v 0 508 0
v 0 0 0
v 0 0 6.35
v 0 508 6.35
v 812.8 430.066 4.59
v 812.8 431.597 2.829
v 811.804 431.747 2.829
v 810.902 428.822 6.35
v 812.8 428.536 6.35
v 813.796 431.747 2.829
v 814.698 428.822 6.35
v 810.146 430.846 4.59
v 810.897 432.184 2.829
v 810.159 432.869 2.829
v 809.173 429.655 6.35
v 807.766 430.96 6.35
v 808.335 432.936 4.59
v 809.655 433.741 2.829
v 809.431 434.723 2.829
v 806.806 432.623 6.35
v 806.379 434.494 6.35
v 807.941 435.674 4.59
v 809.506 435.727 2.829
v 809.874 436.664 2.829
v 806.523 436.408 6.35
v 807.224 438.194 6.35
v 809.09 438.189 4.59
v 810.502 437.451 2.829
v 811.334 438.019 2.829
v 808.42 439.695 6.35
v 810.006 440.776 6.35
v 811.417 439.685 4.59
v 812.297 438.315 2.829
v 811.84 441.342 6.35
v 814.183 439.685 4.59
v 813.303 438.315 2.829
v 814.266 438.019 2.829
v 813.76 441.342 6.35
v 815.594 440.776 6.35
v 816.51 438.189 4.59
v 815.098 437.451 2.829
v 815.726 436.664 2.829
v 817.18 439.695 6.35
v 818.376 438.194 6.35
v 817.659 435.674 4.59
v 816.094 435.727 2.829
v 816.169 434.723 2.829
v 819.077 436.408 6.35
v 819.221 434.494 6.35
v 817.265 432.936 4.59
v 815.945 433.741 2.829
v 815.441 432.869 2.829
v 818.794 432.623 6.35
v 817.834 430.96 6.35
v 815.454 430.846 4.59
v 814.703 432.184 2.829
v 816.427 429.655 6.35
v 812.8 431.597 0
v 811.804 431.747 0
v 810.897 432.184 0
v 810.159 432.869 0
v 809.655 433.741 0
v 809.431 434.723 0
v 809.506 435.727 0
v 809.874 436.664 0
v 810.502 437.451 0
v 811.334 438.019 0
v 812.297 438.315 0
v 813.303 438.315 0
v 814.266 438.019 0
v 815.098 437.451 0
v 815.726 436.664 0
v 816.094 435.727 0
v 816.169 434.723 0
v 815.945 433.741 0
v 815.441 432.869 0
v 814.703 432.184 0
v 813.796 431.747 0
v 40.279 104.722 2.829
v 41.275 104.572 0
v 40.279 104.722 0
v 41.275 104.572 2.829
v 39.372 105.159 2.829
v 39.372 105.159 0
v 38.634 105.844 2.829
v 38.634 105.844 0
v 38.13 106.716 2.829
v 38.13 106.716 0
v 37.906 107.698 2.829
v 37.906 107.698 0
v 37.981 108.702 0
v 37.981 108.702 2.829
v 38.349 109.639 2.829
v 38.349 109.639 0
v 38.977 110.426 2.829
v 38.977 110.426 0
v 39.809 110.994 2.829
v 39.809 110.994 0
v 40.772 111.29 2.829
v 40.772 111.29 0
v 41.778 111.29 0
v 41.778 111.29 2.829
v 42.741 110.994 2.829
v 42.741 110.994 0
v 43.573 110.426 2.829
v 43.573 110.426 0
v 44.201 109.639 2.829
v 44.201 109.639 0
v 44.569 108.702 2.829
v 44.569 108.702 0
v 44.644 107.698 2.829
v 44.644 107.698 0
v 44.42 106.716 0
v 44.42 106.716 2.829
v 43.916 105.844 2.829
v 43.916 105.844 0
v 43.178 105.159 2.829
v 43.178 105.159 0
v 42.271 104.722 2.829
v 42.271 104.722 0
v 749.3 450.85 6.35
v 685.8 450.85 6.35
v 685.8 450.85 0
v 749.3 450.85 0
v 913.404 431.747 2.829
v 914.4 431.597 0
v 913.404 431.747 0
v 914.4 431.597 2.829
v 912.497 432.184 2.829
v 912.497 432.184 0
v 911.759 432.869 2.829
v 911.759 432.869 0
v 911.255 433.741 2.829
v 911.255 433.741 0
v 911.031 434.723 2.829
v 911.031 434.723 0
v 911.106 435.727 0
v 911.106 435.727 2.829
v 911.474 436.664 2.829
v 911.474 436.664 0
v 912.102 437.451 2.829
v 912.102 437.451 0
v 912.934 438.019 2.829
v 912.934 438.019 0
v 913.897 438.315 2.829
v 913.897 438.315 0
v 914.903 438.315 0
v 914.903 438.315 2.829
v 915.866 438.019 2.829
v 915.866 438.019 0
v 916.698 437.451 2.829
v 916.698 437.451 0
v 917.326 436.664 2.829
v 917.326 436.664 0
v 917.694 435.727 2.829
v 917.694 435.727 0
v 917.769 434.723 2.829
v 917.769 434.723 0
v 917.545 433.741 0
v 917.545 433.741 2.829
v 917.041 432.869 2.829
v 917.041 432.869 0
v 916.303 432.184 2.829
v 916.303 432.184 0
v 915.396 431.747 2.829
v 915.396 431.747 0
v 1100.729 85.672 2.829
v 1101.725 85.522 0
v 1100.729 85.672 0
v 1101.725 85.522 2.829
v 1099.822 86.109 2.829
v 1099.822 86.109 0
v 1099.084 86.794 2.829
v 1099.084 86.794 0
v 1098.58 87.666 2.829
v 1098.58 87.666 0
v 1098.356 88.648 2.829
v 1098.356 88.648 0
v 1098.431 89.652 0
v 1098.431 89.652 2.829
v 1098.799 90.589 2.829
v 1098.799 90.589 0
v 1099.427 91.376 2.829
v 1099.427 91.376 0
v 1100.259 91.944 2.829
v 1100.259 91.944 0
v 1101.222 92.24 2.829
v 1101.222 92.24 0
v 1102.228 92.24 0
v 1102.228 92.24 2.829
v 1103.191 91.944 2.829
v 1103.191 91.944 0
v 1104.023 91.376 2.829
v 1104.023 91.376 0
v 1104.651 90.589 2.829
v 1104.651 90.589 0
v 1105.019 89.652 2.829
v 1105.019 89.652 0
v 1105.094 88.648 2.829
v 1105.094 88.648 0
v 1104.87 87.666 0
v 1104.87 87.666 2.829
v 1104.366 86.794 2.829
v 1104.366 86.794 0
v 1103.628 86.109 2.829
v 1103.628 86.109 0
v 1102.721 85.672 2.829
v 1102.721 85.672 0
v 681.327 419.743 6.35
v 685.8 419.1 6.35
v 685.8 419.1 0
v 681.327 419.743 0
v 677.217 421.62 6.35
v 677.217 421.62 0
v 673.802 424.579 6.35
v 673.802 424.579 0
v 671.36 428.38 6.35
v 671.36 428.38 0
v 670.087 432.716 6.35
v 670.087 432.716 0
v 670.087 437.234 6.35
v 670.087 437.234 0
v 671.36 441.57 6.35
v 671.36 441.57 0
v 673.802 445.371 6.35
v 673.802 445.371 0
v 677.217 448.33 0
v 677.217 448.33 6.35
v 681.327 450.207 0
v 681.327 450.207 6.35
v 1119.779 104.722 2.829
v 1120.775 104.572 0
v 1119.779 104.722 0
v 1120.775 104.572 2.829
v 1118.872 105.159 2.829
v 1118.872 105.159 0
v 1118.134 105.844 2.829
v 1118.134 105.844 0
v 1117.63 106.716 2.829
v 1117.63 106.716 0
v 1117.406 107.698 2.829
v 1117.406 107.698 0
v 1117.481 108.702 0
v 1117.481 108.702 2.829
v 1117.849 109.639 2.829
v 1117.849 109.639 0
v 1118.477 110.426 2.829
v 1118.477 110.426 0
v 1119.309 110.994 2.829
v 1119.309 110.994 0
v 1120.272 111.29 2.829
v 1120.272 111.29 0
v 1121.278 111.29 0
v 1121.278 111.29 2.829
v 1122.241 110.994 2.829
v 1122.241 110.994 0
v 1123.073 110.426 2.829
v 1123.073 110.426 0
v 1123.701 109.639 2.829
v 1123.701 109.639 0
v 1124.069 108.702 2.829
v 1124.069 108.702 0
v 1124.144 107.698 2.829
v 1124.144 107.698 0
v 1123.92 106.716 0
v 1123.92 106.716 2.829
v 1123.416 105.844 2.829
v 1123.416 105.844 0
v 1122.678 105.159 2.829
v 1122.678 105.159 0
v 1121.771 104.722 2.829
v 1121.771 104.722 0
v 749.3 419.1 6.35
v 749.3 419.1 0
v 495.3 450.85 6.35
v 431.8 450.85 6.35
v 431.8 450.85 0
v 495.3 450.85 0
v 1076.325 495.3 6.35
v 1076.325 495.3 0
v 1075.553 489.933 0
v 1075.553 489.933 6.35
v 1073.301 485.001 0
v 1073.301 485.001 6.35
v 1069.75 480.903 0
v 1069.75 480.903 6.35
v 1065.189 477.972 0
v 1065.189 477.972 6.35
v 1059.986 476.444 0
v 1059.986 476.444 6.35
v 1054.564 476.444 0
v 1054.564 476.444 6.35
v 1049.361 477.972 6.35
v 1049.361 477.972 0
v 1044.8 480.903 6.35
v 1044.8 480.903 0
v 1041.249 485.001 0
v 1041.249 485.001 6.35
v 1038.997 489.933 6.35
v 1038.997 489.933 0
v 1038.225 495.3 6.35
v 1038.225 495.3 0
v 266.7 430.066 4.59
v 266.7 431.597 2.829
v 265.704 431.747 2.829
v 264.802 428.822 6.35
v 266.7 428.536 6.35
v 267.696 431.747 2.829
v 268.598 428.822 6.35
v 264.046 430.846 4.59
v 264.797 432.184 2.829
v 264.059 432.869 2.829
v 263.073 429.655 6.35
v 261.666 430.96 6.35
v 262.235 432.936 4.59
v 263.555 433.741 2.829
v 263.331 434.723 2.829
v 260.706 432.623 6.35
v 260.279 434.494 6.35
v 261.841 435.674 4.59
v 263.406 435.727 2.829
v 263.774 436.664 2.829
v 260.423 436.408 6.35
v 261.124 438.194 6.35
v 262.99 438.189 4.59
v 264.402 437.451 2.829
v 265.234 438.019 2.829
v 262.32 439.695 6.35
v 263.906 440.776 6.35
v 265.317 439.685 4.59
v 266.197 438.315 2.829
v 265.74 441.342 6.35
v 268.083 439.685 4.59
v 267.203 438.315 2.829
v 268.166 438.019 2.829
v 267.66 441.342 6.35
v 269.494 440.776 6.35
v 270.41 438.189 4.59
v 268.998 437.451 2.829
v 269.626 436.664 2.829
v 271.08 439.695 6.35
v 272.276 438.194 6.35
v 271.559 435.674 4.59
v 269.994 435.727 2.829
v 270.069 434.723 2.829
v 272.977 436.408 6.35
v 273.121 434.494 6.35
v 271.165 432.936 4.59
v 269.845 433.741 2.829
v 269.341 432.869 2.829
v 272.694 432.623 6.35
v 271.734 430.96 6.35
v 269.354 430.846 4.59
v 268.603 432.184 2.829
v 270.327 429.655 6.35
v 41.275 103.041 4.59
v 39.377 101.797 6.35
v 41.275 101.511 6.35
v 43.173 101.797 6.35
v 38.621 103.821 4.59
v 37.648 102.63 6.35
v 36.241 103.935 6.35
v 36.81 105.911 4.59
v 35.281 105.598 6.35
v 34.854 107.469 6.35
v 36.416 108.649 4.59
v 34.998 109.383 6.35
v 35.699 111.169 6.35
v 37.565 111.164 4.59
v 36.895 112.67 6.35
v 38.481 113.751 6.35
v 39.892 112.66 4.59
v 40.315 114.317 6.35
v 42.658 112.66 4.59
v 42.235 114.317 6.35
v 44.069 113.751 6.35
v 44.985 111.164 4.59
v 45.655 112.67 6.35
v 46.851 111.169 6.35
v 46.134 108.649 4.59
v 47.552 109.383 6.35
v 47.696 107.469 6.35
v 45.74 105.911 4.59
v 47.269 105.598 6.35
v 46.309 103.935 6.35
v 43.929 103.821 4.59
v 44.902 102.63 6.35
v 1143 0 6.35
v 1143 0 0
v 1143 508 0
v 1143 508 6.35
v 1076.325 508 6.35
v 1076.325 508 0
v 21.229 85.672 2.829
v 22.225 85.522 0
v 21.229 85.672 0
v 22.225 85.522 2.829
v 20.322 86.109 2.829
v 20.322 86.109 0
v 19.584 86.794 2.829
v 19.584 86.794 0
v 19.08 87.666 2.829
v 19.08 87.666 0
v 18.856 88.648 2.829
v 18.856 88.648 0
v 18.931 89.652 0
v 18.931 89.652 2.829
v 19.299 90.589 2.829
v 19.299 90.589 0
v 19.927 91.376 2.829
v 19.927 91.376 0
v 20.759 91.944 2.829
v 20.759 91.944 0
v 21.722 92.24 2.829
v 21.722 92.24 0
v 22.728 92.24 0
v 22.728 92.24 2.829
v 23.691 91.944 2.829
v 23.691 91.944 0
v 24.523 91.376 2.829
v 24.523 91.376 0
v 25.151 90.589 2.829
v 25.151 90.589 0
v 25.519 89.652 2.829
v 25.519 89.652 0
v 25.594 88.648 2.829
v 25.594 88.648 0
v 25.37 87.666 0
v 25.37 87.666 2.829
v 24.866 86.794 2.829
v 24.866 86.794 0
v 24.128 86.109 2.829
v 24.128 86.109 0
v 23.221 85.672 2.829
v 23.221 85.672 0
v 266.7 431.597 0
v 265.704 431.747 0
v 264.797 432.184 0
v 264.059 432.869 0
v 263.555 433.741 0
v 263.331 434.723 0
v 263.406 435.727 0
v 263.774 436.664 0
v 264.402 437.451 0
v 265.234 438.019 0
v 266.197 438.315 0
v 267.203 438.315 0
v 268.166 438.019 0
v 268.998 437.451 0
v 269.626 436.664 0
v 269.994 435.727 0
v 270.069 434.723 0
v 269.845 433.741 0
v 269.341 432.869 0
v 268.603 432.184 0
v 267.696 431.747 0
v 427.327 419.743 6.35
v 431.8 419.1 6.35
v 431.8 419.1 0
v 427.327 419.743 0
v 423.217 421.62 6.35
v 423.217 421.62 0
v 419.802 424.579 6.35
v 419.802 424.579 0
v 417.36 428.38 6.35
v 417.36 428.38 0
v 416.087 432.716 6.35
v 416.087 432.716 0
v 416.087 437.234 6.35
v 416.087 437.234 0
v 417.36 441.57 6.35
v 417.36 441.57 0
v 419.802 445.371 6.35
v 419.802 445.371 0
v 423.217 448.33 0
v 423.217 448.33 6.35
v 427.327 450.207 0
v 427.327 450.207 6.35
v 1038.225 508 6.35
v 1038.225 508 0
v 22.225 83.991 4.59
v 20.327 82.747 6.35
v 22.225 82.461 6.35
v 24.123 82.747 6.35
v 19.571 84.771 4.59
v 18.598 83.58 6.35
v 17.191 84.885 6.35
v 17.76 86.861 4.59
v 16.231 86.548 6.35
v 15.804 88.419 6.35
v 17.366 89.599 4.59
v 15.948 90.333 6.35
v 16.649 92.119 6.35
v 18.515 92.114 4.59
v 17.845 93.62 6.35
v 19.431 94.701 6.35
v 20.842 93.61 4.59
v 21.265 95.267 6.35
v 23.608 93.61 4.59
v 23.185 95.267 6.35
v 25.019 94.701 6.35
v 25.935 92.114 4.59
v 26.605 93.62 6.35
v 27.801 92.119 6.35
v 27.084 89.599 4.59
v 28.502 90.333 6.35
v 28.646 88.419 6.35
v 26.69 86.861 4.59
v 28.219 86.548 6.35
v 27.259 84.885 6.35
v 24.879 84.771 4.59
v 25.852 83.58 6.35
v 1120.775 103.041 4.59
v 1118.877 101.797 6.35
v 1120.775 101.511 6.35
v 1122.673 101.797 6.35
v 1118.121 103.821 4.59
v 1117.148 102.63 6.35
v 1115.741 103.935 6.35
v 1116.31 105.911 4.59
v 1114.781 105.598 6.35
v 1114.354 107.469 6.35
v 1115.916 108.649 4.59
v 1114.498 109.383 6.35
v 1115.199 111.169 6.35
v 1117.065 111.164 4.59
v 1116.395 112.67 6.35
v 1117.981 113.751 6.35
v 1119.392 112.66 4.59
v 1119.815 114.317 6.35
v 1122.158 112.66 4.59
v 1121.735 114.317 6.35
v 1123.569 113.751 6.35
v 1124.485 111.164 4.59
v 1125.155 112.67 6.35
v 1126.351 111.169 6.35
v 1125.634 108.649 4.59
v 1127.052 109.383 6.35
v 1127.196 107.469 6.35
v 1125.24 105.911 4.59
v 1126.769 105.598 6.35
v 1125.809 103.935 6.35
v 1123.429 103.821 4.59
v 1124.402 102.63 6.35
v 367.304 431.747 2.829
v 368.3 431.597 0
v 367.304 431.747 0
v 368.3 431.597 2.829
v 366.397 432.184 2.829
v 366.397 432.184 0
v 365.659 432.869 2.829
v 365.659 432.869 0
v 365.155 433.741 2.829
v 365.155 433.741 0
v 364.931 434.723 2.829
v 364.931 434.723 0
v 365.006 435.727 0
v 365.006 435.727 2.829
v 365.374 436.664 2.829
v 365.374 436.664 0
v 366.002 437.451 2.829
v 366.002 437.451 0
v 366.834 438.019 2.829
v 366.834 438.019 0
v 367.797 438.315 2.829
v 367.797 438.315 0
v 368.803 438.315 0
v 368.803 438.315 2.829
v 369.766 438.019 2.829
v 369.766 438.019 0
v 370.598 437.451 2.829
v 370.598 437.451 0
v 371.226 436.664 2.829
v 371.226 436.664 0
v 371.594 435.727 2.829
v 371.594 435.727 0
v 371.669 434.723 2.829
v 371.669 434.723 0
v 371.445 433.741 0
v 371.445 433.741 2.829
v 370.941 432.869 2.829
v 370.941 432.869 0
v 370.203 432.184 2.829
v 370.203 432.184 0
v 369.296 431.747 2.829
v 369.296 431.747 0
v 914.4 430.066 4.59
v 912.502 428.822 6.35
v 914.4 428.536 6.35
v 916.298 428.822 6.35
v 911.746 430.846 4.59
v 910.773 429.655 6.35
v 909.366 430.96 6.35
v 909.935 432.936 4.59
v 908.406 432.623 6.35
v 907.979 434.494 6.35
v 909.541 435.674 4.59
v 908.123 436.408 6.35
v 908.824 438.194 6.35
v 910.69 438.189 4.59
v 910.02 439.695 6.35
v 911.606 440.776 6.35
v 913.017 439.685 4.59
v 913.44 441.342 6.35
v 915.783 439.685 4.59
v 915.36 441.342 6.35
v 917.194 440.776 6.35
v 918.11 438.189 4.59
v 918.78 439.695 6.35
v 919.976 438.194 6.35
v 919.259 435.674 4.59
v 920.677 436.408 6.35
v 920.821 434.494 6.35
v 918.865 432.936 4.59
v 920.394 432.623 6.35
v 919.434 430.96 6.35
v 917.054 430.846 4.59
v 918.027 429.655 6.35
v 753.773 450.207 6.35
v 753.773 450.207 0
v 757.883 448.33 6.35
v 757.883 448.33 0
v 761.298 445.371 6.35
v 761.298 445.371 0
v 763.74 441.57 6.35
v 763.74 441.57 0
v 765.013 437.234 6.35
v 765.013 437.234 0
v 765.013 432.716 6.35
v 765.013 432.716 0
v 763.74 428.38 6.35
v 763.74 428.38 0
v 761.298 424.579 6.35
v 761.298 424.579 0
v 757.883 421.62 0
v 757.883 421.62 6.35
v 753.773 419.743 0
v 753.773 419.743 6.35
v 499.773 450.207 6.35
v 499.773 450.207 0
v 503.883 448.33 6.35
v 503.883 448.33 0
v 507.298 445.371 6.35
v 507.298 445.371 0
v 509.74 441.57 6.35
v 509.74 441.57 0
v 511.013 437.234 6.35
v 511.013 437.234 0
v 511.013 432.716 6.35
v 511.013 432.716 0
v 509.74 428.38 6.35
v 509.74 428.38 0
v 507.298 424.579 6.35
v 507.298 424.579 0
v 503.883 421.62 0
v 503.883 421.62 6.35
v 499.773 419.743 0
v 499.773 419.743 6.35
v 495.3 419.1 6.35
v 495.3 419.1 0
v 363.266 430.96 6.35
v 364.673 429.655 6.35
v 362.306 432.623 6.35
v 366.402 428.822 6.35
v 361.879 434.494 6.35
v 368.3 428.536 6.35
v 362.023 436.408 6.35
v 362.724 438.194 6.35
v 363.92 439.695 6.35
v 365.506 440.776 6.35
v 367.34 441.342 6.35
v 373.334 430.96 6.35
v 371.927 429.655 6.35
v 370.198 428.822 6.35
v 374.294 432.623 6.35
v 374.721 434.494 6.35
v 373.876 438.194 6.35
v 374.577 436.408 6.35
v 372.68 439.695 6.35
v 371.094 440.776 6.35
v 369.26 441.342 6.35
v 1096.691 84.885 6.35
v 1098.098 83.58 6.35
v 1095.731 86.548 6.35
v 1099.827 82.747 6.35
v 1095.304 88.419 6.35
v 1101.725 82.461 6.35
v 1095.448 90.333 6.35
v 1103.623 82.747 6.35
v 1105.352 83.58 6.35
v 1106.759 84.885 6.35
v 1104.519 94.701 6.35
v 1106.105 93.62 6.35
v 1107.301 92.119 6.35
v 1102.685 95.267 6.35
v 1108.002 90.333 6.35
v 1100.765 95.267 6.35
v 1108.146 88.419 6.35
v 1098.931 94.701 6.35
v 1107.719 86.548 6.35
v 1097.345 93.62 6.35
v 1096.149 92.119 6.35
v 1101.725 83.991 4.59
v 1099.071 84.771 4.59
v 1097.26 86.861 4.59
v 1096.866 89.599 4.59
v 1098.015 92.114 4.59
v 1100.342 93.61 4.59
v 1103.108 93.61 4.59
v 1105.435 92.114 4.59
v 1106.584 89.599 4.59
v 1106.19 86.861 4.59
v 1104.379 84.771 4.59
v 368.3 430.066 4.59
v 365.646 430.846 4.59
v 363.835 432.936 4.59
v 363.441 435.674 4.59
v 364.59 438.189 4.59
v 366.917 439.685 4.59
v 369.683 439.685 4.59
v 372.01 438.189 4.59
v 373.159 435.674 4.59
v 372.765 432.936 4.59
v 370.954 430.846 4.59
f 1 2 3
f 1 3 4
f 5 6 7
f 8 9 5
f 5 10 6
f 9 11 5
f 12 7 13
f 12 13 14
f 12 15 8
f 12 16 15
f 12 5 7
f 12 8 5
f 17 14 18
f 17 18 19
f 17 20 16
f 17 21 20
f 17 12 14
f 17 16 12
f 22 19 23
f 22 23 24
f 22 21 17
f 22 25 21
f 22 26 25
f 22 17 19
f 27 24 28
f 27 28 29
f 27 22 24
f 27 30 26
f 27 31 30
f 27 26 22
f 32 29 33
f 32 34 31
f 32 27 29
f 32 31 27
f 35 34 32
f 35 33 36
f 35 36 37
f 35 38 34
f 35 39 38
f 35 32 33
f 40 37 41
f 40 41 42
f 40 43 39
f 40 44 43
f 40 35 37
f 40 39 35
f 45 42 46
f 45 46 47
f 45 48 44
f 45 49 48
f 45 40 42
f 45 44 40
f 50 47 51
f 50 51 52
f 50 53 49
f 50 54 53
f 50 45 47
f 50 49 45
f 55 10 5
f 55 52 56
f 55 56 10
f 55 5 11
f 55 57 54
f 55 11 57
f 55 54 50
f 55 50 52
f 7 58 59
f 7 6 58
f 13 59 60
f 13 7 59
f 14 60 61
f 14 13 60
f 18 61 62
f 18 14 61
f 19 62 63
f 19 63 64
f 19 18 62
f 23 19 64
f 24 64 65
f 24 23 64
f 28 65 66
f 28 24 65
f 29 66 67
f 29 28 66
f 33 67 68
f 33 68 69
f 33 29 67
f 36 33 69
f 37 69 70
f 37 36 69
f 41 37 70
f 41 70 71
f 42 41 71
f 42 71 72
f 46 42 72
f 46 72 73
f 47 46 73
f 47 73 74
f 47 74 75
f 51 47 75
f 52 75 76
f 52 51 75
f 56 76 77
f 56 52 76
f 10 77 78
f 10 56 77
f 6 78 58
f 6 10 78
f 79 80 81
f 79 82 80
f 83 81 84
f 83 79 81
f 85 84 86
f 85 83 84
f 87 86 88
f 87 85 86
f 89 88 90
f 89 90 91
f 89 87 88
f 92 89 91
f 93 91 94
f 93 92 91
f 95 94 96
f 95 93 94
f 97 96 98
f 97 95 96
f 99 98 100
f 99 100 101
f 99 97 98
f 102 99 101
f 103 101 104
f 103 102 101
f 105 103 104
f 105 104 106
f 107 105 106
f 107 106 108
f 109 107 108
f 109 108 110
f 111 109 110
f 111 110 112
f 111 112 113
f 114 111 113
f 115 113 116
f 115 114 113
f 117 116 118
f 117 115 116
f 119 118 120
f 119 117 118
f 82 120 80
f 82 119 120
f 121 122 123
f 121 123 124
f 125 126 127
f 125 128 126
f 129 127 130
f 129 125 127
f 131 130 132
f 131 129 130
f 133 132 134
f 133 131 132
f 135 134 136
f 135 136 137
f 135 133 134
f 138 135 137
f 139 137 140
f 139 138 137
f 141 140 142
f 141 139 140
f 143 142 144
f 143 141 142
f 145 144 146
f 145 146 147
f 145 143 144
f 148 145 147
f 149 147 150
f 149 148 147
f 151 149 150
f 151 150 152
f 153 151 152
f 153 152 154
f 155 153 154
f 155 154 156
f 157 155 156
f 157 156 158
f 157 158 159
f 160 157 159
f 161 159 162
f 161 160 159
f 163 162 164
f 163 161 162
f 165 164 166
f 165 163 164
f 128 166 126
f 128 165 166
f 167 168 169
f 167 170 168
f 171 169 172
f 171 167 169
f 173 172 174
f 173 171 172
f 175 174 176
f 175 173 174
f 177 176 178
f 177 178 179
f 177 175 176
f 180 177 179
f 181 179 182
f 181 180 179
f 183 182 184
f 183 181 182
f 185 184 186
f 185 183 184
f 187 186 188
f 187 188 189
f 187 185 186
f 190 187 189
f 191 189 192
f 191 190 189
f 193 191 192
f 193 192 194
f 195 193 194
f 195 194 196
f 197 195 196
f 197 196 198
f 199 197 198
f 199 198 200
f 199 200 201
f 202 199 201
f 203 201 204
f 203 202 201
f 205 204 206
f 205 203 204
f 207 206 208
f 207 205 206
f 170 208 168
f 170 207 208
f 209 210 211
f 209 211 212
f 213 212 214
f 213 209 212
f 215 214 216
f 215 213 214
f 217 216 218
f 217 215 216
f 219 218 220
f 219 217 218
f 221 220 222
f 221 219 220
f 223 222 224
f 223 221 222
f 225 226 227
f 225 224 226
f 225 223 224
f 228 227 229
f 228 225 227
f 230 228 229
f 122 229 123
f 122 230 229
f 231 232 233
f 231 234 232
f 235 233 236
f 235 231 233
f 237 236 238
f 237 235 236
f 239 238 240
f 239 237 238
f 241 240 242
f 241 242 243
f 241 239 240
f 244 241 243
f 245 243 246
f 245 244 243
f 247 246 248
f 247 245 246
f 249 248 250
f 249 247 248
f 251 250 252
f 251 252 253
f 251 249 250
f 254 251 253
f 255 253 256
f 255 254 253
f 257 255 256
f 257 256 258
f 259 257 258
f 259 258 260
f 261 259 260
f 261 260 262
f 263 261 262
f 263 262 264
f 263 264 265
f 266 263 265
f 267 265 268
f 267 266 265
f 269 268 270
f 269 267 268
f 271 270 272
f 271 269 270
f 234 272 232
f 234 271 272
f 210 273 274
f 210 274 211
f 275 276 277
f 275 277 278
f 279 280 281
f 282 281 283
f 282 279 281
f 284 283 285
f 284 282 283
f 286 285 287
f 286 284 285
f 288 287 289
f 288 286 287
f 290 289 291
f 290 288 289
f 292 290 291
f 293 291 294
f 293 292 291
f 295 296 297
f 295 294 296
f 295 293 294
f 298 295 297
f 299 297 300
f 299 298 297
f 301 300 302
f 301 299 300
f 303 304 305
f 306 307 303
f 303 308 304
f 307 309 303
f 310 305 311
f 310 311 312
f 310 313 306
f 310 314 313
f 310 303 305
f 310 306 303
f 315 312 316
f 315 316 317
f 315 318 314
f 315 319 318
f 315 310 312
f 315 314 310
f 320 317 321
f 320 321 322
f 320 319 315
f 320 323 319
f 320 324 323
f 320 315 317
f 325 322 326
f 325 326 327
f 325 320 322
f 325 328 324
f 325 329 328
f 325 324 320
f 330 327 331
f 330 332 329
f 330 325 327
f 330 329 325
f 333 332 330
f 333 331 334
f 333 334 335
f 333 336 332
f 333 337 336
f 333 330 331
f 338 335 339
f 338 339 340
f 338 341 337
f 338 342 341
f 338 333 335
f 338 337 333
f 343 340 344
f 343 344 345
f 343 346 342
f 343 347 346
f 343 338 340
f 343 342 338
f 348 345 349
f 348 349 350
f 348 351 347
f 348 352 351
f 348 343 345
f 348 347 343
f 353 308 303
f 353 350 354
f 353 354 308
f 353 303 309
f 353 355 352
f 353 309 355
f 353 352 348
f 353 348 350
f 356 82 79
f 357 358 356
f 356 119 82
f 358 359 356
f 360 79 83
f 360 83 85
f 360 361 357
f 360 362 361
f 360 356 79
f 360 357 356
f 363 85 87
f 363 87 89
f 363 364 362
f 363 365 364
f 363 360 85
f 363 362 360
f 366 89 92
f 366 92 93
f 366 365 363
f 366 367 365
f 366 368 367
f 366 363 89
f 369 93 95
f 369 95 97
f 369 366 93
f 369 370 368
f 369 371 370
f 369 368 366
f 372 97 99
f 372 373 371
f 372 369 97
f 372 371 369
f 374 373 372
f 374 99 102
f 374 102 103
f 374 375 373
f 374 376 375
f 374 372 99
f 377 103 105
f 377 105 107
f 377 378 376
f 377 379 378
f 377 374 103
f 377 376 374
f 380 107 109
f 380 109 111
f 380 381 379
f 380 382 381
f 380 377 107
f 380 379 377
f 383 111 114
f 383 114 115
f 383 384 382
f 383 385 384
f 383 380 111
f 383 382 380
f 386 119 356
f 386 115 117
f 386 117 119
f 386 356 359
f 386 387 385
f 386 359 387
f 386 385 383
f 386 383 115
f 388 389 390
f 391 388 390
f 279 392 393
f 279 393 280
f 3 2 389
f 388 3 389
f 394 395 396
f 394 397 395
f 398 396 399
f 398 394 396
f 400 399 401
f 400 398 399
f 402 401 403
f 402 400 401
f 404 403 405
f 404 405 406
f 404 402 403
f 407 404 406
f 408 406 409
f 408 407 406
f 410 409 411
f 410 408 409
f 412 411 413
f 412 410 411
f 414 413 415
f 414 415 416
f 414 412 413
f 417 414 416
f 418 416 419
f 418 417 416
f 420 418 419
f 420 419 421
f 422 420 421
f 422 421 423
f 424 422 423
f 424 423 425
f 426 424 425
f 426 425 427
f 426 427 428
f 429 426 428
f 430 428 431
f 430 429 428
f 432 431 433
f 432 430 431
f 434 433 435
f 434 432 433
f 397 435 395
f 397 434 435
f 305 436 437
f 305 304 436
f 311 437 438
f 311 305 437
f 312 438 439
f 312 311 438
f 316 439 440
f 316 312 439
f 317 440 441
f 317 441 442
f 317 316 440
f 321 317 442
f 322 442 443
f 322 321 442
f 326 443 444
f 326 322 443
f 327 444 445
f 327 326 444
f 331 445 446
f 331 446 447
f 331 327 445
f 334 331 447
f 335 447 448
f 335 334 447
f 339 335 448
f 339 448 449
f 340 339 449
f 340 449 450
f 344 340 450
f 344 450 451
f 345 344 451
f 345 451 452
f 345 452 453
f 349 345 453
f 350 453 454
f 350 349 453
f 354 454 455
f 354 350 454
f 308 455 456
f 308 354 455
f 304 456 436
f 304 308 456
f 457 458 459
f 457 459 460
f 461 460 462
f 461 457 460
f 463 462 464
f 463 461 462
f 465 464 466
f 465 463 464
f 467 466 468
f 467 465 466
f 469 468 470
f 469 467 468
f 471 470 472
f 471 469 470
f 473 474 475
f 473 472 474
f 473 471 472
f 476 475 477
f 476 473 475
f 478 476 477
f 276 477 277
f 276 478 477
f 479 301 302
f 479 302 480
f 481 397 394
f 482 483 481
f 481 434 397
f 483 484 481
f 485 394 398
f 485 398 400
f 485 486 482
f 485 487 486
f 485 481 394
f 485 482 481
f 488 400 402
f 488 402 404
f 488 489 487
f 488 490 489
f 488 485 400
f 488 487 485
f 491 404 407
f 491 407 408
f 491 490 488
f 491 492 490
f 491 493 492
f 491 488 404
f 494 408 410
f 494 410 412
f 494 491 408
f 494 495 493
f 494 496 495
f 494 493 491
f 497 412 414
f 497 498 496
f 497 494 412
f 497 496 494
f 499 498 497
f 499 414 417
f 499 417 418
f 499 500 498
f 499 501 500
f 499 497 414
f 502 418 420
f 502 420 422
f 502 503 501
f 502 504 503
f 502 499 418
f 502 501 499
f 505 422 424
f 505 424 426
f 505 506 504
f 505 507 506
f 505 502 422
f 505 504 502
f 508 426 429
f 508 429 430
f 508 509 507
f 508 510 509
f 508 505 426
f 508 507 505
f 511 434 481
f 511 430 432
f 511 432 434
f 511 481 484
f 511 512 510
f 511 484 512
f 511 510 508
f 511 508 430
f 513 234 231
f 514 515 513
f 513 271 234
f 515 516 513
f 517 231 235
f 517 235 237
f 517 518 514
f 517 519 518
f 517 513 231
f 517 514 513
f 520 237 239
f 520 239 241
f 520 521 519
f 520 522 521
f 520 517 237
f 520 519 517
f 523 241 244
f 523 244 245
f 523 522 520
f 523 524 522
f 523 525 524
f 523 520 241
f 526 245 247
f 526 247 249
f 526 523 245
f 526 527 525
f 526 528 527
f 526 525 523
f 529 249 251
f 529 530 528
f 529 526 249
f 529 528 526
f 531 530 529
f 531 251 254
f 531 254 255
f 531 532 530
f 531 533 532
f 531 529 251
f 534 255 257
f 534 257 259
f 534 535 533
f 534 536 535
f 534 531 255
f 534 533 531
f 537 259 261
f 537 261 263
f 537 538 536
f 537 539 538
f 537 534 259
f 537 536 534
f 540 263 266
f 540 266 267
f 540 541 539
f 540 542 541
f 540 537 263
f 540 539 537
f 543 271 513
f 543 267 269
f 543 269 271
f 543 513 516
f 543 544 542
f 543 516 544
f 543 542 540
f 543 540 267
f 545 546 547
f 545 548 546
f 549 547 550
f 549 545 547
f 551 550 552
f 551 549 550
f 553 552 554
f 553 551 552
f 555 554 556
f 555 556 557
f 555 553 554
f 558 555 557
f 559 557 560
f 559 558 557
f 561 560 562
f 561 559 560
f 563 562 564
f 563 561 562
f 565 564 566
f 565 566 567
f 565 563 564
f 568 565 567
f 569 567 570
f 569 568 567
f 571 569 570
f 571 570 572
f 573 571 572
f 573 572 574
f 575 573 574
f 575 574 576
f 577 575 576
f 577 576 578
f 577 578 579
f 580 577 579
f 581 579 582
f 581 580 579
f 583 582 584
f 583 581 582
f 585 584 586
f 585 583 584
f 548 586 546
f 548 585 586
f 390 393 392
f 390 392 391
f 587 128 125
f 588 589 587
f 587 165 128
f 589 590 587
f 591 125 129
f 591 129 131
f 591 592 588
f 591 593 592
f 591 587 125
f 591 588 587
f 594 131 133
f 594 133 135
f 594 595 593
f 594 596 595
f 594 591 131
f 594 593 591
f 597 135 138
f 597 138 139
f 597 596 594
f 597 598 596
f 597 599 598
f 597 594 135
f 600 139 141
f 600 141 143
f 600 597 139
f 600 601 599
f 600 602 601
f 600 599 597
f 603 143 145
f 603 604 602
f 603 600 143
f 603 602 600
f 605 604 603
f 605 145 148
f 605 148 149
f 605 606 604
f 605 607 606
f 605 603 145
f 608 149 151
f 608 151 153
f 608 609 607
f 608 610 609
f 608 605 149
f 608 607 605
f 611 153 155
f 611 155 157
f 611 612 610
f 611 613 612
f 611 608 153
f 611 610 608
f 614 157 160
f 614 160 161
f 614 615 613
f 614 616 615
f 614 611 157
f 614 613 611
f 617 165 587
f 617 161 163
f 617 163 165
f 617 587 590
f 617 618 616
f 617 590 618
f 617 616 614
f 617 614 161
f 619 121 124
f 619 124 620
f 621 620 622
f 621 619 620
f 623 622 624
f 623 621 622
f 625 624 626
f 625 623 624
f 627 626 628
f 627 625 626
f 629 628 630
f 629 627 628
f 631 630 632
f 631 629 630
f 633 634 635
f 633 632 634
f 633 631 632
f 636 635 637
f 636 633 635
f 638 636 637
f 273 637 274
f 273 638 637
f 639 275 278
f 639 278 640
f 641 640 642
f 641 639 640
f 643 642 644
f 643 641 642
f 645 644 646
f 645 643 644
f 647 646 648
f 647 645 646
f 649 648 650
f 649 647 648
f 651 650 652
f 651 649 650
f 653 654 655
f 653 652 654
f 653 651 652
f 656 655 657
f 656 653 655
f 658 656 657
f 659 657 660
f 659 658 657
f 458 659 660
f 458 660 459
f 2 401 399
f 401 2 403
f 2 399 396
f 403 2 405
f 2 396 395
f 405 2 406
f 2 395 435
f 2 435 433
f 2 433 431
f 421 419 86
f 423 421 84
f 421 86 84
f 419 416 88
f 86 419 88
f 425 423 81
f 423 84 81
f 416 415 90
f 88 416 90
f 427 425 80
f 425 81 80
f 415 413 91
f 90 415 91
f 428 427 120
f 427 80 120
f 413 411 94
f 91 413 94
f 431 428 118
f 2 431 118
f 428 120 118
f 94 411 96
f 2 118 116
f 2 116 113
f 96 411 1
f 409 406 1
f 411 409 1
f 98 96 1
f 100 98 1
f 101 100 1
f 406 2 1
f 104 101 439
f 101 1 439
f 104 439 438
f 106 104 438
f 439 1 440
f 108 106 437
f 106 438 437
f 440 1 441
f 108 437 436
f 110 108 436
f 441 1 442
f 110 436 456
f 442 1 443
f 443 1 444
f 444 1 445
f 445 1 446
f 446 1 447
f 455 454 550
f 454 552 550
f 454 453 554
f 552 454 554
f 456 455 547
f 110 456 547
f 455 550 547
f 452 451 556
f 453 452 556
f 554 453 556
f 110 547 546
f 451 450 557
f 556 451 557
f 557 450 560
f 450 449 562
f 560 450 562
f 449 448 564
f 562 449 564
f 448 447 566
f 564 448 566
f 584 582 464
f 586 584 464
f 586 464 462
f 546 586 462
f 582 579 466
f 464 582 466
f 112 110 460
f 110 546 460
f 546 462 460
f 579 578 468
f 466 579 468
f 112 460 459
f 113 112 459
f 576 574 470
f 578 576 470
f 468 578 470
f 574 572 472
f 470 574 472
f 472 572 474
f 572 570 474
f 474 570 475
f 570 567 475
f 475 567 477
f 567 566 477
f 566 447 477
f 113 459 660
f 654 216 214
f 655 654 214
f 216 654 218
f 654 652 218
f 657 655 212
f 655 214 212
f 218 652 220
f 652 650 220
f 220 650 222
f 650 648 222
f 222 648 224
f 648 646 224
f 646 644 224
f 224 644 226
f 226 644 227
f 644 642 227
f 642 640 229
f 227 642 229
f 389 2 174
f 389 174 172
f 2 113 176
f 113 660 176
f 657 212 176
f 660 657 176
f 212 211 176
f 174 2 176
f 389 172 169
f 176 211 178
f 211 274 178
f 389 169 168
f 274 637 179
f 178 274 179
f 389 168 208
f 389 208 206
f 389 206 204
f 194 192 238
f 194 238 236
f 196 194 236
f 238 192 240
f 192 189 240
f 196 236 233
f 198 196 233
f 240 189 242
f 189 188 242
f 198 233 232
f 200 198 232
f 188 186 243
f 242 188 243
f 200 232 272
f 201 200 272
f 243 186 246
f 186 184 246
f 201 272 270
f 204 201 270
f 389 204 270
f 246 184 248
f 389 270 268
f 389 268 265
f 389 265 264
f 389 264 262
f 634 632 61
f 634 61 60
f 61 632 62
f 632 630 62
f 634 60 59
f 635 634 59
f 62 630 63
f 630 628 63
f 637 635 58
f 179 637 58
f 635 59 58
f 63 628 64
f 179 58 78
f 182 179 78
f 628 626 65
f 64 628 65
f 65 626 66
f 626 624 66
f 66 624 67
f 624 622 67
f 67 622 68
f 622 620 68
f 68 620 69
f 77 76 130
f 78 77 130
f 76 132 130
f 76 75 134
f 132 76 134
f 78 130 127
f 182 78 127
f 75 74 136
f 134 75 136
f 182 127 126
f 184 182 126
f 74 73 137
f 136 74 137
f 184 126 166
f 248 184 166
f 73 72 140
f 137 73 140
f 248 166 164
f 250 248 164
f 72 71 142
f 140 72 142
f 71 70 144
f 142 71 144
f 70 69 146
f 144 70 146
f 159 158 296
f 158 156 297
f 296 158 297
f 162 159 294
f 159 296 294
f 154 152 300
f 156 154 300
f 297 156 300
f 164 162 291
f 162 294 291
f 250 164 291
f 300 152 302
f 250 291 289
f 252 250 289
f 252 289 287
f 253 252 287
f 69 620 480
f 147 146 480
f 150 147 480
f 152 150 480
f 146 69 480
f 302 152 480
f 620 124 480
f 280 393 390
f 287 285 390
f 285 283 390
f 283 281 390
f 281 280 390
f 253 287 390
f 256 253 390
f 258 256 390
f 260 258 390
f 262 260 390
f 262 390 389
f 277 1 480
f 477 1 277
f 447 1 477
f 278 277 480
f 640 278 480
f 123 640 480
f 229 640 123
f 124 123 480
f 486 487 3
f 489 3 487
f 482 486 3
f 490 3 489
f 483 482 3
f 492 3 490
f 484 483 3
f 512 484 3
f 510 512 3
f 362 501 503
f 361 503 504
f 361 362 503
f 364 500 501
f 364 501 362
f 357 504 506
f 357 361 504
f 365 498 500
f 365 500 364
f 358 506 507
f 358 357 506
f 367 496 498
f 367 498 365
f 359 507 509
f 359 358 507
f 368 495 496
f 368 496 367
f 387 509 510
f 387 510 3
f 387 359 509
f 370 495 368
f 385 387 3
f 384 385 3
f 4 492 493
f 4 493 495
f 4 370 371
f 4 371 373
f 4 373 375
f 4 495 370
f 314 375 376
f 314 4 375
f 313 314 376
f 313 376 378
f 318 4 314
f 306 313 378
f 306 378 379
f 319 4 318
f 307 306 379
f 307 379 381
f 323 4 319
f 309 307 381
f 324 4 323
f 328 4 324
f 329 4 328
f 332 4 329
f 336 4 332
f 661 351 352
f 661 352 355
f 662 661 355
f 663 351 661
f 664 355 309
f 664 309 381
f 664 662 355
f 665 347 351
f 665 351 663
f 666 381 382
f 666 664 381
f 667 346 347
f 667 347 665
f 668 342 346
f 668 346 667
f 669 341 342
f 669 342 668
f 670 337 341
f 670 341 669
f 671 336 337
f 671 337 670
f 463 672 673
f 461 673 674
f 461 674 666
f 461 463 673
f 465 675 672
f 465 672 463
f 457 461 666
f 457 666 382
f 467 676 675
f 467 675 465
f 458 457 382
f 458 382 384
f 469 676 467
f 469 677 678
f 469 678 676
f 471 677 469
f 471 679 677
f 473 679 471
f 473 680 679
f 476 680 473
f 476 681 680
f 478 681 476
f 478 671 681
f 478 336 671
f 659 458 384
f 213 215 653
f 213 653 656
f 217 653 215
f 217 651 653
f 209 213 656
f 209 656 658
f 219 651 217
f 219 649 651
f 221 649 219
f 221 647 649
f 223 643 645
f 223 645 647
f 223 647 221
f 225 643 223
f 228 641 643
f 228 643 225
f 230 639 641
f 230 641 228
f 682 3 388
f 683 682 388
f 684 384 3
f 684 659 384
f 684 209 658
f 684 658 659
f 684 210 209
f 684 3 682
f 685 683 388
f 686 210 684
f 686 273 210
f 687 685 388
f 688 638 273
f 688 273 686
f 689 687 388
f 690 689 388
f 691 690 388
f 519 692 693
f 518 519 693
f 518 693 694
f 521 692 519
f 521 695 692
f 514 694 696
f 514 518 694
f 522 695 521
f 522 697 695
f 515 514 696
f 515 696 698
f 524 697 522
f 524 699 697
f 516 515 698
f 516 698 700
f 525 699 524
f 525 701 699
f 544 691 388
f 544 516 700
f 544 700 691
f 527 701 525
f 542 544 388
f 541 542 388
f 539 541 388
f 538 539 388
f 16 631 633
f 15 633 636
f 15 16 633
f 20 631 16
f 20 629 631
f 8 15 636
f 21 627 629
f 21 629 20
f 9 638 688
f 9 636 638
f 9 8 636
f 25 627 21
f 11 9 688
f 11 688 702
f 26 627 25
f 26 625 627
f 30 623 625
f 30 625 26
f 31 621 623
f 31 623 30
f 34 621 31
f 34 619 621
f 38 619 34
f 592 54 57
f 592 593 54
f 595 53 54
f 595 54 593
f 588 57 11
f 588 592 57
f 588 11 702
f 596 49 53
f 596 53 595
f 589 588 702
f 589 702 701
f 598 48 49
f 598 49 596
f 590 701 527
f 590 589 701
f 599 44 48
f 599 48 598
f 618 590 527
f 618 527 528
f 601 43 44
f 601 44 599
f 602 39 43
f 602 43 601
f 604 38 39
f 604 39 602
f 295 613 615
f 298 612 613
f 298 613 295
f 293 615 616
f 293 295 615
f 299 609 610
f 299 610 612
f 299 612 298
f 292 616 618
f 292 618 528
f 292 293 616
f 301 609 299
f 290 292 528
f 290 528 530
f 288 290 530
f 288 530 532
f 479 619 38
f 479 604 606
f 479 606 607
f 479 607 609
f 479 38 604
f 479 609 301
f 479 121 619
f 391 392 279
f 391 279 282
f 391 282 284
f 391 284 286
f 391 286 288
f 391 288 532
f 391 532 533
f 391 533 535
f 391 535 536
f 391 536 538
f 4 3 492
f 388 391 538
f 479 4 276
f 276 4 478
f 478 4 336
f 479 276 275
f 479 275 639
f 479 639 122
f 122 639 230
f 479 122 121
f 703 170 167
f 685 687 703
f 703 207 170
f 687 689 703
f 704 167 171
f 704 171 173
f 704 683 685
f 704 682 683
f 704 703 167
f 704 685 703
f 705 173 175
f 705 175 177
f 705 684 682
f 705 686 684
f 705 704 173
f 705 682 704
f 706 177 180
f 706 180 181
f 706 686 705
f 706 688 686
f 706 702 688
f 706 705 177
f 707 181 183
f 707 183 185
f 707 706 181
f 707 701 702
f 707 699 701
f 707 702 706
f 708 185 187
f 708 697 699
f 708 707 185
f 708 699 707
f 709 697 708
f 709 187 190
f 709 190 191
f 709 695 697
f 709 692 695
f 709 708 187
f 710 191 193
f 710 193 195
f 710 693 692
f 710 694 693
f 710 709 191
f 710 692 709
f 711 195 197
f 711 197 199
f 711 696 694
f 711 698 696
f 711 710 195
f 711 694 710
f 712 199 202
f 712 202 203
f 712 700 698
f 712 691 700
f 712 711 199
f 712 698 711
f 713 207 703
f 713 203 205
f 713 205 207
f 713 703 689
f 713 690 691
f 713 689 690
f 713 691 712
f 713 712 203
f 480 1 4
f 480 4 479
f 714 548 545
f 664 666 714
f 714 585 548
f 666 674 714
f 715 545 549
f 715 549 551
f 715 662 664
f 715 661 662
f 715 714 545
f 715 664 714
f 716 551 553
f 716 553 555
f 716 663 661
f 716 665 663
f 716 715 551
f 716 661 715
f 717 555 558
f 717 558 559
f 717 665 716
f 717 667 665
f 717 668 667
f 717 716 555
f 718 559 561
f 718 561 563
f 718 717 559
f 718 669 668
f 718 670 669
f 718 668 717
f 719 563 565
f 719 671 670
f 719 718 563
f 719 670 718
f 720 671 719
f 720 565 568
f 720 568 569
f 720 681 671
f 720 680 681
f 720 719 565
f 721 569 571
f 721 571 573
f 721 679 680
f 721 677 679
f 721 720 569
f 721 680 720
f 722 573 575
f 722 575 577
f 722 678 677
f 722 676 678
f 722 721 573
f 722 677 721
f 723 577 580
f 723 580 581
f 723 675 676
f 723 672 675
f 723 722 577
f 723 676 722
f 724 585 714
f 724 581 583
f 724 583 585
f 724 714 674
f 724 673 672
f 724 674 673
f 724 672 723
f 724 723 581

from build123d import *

# Parameters (mm, degrees)
SKETCH1_W                                     = 1143
SKETCH1_H                                     = 508
BOSS_EXTRUDE1_DEPTH                           = 6.35
CUT_EXTRUDE1_DEPTH                            = 7.35
CSK_FOR_1_4_FLAT_HEAD_MACHINE_SCREW1_AT_COUNT = 2
CSK_FOR_1_4_FLAT_HEAD_MACHINE_SCREW1_AT_PITCH = 101.6
CSK_FOR_1_4_FLAT_HEAD_MACHINE_SCREW1_2_COUNT  = 2
CSK_FOR_1_4_FLAT_HEAD_MACHINE_SCREW1_2_PITCH  = 546.1
CSK_FOR_1_4_FLAT_HEAD_MACHINE_SCREW1_3_COUNT  = 2
CSK_FOR_1_4_FLAT_HEAD_MACHINE_SCREW1_3_PITCH  = 647.7
CSK_FOR_1_4_FLAT_HEAD_MACHINE_SCREW1_4_COUNT  = 2
CSK_FOR_1_4_FLAT_HEAD_MACHINE_SCREW1_4_PITCH  = 386.698837922
CSK_FOR_1_4_FLAT_HEAD_MACHINE_SCREW1_5_COUNT  = 2
CSK_FOR_1_4_FLAT_HEAD_MACHINE_SCREW1_5_PITCH  = 393.520725312
CSK_FOR_1_4_FLAT_HEAD_MACHINE_SCREW1_6_COUNT  = 2
CSK_FOR_1_4_FLAT_HEAD_MACHINE_SCREW1_6_PITCH  = 932.358630705
CSK_FOR_1_4_FLAT_HEAD_MACHINE_SCREW1_7_COUNT  = 2
CSK_FOR_1_4_FLAT_HEAD_MACHINE_SCREW1_7_PITCH  = 956.945210683
CUT_EXTRUDE2_DEPTH                            = 7.35


with BuildPart() as part:
    # Sketch1 → Boss-Extrude1 (new body)
    with BuildSketch(Plane.XY):
        with Locations((571.5, 254)):
            Rectangle(SKETCH1_W, SKETCH1_H)
    extrude(amount=BOSS_EXTRUDE1_DEPTH)

    # Sketch2 → Cut-Extrude1 (cut, through all)
    with BuildSketch(Plane.XY.offset(6.35)):
        with BuildLine():
            Line((431.8, 450.85), (495.3, 450.85))
            ThreePointArc((495.3, 450.85), (511.175, 434.975), (495.3, 419.1))
            Line((495.3, 419.1), (431.8, 419.1))
            ThreePointArc((431.8, 419.1), (415.925, 434.975), (431.8, 450.85))
        make_face()
        with BuildLine():
            Line((685.8, 450.85), (749.3, 450.85))
            ThreePointArc((749.3, 450.85), (765.175, 434.975), (749.3, 419.1))
            Line((749.3, 419.1), (685.8, 419.1))
            ThreePointArc((685.8, 419.1), (669.925, 434.975), (685.8, 450.85))
        make_face()
    extrude(amount=-CUT_EXTRUDE1_DEPTH, mode=Mode.SUBTRACT)

    # Sketch5 → CSK for 1/4 Flat Head Machine Screw1 (revolve, cut)
    with BuildSketch(Plane(origin=(914.4, 434.975, 6.35), x_dir=(0, -1, 0), z_dir=(1, 0, 0))):
        Polygon((0, 0), (0, 6.35), (3.3782, 6.35), (3.3782, 3.520932584), (6.4389, 0), align=None)
    csk_for_1_4_flat_head_machine_screw1 = revolve(axis=Axis((914.4, 434.975, 12.7), (0, 0, -1)), mode=Mode.SUBTRACT)

    # CSK for 1/4 Flat Head Machine Screw1 at: CSK for 1/4 Flat Head Machine Screw1 ×2
    with Locations(*[(-i * CSK_FOR_1_4_FLAT_HEAD_MACHINE_SCREW1_AT_PITCH, 0, 0) for i in range(1, CSK_FOR_1_4_FLAT_HEAD_MACHINE_SCREW1_AT_COUNT)]):
        add(csk_for_1_4_flat_head_machine_screw1, mode=Mode.SUBTRACT)

    # CSK for 1_4 Flat Head Machine Screw1 2: CSK for 1/4 Flat Head Machine Screw1 ×2
    with Locations(*[(-i * CSK_FOR_1_4_FLAT_HEAD_MACHINE_SCREW1_2_PITCH, 0, 0) for i in range(1, CSK_FOR_1_4_FLAT_HEAD_MACHINE_SCREW1_2_COUNT)]):
        add(csk_for_1_4_flat_head_machine_screw1, mode=Mode.SUBTRACT)

    # CSK for 1_4 Flat Head Machine Screw1 3: CSK for 1/4 Flat Head Machine Screw1 ×2
    with Locations(*[(-i * CSK_FOR_1_4_FLAT_HEAD_MACHINE_SCREW1_3_PITCH, 0, 0) for i in range(1, CSK_FOR_1_4_FLAT_HEAD_MACHINE_SCREW1_3_COUNT)]):
        add(csk_for_1_4_flat_head_machine_screw1, mode=Mode.SUBTRACT)

    # CSK for 1_4 Flat Head Machine Screw1 4: CSK for 1/4 Flat Head Machine Screw1 ×2
    with Locations(*[Vector(0.533684045, -0.845683948, 0) * (i * CSK_FOR_1_4_FLAT_HEAD_MACHINE_SCREW1_4_PITCH) for i in range(1, CSK_FOR_1_4_FLAT_HEAD_MACHINE_SCREW1_4_COUNT)]):
        add(csk_for_1_4_flat_head_machine_screw1, mode=Mode.SUBTRACT)

    # CSK for 1_4 Flat Head Machine Screw1 5: CSK for 1/4 Flat Head Machine Screw1 ×2
    with Locations(*[Vector(0.476023213, -0.879432715, 0) * (i * CSK_FOR_1_4_FLAT_HEAD_MACHINE_SCREW1_5_PITCH) for i in range(1, CSK_FOR_1_4_FLAT_HEAD_MACHINE_SCREW1_5_COUNT)]):
        add(csk_for_1_4_flat_head_machine_screw1, mode=Mode.SUBTRACT)

    # CSK for 1_4 Flat Head Machine Screw1 6: CSK for 1/4 Flat Head Machine Screw1 ×2
    with Locations(*[Vector(-0.936469049, -0.350750226, 0) * (i * CSK_FOR_1_4_FLAT_HEAD_MACHINE_SCREW1_6_PITCH) for i in range(1, CSK_FOR_1_4_FLAT_HEAD_MACHINE_SCREW1_6_COUNT)]):
        add(csk_for_1_4_flat_head_machine_screw1, mode=Mode.SUBTRACT)

    # CSK for 1_4 Flat Head Machine Screw1 7: CSK for 1/4 Flat Head Machine Screw1 ×2
    with Locations(*[Vector(-0.932315654, -0.361645574, 0) * (i * CSK_FOR_1_4_FLAT_HEAD_MACHINE_SCREW1_7_PITCH) for i in range(1, CSK_FOR_1_4_FLAT_HEAD_MACHINE_SCREW1_7_COUNT)]):
        add(csk_for_1_4_flat_head_machine_screw1, mode=Mode.SUBTRACT)

    # Sketch6 → Cut-Extrude2 (cut, through all)
    with BuildSketch(Plane.XY.offset(6.35)):
        with BuildLine():
            Line((1038.225, 508), (1076.325, 508))
            Line((1076.325, 508), (1076.325, 495.3))
            ThreePointArc((1076.325, 495.3), (1057.275, 476.25), (1038.225, 495.3))
            Line((1038.225, 495.3), (1038.225, 508))
        make_face()
    extrude(amount=-CUT_EXTRUDE2_DEPTH, mode=Mode.SUBTRACT)


solid = part.part
